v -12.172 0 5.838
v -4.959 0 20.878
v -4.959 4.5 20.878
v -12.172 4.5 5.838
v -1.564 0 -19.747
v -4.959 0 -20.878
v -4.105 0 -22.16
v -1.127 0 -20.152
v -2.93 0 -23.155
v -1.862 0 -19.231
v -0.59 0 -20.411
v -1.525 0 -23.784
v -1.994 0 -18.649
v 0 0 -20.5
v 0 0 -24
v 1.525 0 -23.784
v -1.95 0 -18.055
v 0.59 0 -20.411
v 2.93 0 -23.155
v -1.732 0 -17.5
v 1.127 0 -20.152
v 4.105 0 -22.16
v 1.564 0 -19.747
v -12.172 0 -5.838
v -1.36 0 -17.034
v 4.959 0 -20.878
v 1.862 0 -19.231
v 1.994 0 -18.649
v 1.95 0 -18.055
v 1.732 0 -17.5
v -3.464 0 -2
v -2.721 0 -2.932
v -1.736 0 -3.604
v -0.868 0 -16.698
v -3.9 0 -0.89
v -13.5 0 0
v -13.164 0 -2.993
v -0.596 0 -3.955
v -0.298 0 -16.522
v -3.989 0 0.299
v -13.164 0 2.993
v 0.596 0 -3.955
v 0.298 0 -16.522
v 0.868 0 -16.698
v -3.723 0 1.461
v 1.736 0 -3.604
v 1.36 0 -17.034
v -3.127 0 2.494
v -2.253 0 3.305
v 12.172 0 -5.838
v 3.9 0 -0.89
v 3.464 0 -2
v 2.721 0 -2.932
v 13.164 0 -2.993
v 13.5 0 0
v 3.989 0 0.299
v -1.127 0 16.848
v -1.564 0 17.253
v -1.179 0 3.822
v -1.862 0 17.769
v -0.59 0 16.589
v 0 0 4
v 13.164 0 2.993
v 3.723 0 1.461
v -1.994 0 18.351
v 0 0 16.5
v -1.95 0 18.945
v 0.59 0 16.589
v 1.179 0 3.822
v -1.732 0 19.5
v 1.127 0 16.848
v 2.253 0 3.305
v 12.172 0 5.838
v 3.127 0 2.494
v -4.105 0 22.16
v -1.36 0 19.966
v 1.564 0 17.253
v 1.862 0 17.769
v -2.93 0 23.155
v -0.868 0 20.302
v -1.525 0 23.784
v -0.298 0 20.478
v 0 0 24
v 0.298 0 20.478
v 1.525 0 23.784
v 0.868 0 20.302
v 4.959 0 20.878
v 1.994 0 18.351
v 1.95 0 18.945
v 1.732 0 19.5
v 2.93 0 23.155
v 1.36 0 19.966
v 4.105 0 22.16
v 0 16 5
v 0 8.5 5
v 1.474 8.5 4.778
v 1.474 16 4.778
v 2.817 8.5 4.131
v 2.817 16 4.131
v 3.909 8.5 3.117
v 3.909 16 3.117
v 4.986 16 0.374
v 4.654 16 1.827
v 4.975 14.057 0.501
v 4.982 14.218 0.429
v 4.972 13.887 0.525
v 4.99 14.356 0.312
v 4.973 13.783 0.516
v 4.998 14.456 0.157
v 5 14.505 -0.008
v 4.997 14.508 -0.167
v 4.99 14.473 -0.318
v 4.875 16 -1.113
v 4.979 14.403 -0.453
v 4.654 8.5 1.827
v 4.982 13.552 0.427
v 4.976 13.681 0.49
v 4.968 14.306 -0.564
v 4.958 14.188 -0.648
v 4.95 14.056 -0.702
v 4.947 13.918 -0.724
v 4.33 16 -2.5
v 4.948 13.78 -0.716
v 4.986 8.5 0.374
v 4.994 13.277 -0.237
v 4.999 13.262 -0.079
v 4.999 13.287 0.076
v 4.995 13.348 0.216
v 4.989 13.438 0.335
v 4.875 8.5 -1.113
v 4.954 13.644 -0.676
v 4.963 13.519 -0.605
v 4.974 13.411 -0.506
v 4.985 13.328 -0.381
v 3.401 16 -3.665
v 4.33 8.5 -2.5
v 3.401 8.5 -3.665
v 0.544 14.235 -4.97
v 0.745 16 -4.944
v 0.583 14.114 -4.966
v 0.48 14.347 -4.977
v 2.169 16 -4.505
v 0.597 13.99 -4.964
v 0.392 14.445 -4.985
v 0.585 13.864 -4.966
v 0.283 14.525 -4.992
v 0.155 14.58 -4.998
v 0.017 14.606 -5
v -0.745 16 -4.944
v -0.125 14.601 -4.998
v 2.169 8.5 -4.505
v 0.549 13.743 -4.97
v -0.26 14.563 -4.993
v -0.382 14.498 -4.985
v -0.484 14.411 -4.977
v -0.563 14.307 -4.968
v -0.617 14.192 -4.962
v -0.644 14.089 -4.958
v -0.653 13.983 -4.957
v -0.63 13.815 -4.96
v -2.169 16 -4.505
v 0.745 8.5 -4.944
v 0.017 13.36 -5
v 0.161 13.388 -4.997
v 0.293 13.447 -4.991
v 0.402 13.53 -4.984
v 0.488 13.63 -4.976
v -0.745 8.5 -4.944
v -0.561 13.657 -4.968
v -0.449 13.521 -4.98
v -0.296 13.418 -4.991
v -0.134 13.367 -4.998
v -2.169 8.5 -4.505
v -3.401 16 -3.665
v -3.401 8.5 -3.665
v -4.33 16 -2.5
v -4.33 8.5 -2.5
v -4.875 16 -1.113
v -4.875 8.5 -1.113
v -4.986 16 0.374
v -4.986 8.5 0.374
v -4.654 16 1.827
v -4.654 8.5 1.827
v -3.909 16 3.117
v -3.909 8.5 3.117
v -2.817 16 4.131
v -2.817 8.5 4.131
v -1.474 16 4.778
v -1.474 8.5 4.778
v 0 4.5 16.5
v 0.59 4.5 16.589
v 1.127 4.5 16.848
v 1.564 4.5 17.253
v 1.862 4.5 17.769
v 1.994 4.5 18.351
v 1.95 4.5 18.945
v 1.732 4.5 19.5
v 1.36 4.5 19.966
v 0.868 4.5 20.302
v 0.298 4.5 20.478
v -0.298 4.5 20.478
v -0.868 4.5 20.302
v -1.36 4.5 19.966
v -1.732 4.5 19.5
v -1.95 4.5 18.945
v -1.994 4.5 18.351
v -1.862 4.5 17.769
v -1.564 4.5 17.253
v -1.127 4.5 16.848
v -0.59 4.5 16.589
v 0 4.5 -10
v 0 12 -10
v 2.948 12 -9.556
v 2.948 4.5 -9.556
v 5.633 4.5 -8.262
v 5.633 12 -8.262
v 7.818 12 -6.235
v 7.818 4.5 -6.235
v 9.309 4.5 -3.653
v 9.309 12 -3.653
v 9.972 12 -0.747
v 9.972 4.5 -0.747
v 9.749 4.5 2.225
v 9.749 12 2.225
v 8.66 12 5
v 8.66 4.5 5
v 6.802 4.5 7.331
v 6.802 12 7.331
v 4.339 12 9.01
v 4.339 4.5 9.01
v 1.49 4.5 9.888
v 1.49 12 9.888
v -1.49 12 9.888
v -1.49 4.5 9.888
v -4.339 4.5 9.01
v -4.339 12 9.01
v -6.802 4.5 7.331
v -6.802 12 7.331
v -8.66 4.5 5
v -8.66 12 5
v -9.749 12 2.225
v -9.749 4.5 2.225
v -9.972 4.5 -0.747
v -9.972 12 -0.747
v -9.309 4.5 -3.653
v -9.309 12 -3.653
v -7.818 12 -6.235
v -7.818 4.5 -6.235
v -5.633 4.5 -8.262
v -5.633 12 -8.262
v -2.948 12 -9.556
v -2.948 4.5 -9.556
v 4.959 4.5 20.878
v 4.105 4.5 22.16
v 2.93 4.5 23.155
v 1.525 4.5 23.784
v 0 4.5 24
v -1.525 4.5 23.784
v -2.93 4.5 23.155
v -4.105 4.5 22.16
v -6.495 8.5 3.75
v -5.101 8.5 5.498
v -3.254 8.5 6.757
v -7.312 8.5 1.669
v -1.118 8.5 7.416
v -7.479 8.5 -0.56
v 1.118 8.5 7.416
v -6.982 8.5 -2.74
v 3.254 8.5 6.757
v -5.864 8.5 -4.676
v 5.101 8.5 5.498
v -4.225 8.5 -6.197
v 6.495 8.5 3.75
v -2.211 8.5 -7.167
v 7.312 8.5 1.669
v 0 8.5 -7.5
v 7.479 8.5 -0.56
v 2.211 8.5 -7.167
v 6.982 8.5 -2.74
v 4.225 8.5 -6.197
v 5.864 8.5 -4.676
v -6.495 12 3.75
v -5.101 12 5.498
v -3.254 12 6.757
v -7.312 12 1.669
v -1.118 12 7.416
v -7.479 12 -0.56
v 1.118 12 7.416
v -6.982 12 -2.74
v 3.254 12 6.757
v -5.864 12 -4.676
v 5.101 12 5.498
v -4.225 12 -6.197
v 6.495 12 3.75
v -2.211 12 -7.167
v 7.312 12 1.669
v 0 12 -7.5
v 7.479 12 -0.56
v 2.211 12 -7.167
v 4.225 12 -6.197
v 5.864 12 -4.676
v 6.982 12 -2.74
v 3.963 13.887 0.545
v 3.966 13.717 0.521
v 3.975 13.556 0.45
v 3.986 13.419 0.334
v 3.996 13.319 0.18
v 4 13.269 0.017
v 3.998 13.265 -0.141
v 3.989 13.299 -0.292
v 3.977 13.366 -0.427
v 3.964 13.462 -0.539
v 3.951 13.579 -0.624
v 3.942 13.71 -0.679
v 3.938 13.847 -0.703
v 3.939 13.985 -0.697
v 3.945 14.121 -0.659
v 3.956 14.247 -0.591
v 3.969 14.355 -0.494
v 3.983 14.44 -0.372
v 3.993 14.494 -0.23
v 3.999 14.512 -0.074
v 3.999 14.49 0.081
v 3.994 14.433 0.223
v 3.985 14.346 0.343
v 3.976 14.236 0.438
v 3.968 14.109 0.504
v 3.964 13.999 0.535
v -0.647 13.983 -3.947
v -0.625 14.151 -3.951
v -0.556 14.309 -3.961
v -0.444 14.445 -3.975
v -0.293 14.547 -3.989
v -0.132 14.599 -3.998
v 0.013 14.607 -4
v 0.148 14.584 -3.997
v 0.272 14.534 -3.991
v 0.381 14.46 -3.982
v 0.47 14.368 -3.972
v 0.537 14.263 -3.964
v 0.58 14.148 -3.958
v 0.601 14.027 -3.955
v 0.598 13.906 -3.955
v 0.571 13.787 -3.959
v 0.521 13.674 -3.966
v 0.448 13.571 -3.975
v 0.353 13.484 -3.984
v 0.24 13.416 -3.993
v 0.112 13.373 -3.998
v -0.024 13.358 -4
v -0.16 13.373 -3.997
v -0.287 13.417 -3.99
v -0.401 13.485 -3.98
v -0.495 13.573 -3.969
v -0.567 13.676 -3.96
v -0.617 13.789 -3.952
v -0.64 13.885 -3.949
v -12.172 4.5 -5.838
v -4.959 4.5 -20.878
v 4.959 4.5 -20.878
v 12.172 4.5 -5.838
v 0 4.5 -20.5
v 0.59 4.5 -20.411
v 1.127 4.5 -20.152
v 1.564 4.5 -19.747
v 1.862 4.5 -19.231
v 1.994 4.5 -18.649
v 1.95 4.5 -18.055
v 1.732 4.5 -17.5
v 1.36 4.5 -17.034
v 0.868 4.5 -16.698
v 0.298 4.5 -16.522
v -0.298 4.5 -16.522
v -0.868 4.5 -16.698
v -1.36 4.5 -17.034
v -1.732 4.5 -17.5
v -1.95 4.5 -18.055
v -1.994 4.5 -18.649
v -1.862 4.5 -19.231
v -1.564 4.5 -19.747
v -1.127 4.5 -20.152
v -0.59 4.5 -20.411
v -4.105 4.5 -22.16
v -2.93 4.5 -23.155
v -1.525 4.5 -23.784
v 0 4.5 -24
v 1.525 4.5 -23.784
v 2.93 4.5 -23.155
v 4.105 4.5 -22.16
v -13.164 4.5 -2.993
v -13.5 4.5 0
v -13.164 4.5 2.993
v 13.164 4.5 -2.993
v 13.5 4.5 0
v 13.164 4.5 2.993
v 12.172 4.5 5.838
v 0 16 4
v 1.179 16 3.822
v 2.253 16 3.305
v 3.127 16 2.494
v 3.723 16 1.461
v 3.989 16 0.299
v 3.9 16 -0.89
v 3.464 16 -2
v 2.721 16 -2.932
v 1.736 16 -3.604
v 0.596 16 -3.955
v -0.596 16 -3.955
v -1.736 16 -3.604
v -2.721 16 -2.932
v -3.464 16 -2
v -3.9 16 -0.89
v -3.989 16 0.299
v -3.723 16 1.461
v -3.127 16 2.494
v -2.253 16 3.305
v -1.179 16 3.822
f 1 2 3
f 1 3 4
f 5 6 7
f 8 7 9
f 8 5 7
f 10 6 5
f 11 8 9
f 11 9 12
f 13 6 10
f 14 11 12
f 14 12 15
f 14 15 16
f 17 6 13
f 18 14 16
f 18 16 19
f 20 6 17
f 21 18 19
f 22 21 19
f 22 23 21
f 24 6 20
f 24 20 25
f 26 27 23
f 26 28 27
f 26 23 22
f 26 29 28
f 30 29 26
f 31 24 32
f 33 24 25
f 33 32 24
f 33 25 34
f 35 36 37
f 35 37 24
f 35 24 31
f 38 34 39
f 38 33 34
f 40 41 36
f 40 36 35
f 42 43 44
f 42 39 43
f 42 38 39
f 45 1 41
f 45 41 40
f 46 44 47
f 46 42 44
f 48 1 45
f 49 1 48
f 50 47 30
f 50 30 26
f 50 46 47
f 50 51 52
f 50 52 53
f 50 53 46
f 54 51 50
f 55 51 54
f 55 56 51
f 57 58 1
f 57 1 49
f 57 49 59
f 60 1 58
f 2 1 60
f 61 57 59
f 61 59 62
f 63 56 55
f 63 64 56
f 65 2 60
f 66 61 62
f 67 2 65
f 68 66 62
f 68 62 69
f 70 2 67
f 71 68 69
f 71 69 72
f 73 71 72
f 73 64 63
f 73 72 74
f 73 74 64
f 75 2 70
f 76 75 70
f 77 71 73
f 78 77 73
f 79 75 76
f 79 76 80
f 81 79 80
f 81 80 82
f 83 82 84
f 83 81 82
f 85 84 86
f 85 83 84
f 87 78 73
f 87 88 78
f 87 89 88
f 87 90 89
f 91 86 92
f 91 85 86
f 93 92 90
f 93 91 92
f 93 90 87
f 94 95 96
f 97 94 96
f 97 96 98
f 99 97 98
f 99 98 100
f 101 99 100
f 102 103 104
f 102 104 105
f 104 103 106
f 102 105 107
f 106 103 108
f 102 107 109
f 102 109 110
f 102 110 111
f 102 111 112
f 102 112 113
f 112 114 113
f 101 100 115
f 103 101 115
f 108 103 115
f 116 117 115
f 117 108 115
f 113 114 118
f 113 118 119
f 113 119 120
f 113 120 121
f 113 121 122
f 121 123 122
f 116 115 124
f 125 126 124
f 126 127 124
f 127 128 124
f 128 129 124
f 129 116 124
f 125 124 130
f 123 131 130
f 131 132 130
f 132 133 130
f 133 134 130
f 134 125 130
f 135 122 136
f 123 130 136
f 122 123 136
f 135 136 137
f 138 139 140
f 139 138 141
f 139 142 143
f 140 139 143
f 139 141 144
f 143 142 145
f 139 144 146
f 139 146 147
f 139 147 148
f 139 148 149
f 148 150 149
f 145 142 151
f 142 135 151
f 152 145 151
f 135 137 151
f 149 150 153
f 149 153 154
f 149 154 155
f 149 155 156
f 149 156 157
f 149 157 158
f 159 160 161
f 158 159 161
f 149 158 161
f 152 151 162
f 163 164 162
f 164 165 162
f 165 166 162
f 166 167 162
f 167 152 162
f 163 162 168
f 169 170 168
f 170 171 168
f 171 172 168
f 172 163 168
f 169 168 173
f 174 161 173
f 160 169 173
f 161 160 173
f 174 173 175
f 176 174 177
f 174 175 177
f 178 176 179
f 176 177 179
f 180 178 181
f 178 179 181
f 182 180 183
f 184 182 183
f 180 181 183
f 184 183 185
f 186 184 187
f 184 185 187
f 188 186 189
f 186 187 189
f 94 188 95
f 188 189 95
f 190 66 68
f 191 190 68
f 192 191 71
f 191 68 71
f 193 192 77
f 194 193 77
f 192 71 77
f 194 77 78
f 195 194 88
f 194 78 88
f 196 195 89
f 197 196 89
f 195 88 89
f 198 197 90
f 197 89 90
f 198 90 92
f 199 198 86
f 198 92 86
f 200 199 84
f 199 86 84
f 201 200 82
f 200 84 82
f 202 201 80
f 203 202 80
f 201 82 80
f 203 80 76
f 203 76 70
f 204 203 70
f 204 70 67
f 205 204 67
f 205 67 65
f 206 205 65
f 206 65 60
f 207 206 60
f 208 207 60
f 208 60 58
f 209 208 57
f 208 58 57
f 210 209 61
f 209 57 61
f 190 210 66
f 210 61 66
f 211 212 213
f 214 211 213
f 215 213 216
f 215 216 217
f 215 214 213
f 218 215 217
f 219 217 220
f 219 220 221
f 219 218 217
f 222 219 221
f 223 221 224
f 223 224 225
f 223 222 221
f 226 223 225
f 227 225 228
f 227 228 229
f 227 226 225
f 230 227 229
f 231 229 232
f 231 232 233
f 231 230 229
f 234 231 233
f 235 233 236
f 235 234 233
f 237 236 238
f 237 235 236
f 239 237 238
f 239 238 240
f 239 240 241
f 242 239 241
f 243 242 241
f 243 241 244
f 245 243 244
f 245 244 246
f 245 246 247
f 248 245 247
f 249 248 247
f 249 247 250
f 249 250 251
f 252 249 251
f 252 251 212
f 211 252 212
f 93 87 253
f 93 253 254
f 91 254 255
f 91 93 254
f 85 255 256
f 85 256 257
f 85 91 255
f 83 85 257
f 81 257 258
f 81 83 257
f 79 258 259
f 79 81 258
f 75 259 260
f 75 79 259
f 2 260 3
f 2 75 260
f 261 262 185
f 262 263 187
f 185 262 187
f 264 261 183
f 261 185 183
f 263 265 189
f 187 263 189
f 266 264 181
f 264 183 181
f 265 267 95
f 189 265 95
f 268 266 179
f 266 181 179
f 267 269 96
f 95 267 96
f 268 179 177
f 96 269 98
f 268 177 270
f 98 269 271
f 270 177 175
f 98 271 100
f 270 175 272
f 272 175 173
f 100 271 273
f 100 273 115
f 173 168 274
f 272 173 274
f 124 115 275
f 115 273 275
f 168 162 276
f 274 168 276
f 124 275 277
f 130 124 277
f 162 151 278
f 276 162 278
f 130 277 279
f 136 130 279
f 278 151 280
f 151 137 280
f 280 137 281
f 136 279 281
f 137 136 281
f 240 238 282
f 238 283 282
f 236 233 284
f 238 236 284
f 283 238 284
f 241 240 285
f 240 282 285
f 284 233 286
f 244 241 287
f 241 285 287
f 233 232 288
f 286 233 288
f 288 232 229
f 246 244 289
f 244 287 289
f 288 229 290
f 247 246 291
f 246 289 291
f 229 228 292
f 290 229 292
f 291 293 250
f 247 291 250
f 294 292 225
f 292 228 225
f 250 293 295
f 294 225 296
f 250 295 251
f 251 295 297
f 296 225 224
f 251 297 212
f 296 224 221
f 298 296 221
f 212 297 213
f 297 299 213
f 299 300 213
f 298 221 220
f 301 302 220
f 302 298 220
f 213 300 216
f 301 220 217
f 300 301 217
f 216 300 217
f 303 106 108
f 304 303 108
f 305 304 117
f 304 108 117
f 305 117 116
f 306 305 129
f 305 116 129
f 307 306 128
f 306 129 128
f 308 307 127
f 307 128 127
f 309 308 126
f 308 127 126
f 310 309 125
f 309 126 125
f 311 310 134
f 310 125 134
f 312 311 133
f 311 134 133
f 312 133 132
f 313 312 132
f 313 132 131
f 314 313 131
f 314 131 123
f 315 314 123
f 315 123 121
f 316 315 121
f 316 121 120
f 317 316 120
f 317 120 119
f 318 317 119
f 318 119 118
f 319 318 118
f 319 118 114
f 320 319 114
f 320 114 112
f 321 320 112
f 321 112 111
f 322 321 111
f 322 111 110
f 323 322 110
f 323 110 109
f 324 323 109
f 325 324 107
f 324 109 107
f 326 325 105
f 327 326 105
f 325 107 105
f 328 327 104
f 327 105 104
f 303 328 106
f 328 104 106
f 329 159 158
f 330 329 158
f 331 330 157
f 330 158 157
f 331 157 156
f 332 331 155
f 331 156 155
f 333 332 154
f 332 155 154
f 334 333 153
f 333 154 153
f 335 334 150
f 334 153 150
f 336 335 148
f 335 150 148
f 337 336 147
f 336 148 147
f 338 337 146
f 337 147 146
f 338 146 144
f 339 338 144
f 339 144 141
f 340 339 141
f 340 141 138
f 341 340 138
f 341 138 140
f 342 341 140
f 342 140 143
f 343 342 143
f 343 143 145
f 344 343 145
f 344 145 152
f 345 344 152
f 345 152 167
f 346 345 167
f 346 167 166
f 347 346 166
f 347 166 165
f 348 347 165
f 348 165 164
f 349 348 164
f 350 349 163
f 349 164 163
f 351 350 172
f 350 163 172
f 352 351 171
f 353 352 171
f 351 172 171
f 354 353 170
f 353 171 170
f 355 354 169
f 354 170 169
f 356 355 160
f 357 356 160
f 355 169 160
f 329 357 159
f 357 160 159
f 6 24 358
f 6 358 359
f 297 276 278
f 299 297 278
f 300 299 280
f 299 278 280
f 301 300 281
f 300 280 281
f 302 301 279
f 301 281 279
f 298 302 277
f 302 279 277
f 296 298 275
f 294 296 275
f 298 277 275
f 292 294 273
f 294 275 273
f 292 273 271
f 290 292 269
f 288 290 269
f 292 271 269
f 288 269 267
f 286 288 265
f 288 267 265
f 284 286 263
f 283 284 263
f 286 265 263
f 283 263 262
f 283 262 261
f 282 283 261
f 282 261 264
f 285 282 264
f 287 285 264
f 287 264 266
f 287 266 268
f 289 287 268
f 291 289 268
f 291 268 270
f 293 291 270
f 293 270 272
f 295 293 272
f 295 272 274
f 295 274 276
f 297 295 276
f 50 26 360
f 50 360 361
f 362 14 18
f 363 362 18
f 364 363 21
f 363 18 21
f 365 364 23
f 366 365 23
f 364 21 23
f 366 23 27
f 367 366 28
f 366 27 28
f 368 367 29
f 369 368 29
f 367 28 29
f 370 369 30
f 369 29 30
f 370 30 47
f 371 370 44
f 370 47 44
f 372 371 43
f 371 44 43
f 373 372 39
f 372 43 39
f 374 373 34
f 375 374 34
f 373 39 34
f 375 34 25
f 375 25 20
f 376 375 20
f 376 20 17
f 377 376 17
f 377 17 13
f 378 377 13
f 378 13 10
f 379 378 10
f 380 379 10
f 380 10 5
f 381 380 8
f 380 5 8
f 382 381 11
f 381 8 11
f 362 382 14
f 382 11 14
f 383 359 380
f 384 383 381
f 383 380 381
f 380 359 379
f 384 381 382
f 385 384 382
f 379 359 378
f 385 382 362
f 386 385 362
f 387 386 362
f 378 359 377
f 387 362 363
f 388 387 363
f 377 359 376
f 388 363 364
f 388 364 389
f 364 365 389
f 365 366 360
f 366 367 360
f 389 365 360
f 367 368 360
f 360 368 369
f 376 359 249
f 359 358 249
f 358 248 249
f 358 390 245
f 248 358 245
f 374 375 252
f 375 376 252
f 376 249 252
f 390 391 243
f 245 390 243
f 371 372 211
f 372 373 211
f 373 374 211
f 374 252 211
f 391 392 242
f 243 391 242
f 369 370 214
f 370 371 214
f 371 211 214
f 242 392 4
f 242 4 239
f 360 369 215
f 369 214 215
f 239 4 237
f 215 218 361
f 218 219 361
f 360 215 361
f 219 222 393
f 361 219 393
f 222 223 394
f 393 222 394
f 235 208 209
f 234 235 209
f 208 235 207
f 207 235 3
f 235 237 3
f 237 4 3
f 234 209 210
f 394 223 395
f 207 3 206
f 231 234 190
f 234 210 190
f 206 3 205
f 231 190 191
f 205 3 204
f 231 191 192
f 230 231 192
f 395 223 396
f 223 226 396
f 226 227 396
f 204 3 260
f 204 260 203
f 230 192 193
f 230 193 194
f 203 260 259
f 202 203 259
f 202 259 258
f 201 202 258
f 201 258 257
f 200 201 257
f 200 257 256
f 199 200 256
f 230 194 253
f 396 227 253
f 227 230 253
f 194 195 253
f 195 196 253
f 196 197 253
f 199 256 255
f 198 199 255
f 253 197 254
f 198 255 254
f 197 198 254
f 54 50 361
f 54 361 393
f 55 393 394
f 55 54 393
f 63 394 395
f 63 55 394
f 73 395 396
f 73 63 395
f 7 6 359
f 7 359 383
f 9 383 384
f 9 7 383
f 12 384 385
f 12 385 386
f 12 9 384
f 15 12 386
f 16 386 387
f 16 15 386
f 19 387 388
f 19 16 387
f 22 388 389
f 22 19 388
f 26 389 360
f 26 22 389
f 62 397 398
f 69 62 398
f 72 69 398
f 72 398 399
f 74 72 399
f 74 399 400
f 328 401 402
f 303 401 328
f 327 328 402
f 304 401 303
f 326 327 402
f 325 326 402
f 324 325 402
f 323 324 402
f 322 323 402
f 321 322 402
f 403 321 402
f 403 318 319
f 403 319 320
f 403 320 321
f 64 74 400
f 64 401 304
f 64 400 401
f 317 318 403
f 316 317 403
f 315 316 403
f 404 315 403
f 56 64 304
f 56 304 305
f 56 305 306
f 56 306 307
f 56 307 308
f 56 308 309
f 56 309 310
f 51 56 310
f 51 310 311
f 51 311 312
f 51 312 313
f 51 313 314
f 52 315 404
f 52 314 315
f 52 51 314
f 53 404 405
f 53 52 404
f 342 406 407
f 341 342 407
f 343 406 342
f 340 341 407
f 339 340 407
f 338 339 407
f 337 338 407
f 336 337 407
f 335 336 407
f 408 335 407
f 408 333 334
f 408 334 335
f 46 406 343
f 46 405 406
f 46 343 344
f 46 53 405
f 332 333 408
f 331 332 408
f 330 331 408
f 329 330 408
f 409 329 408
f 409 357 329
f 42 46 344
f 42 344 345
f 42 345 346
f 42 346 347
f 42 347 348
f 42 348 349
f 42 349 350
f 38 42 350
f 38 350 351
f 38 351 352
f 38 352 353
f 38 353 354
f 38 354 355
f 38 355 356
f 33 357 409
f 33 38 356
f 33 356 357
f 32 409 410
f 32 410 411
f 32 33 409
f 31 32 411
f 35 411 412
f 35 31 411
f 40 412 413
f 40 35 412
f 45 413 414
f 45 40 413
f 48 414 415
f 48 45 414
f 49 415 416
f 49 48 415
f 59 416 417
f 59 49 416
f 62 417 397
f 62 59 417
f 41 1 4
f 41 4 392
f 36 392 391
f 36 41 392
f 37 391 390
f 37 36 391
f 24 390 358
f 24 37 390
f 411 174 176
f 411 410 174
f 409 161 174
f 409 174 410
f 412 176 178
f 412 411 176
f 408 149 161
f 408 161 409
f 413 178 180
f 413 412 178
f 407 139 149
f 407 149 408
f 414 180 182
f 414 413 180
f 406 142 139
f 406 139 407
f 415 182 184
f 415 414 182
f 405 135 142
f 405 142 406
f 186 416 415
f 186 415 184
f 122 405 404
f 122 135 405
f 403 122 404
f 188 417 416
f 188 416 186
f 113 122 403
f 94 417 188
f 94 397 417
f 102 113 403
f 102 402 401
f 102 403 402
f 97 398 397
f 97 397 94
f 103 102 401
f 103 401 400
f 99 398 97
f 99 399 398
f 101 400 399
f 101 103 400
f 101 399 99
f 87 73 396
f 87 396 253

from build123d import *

# Parameters (mm, degrees)
SKETCH_1_R                         = 5
SKETCH_1_R_2                       = 4
EXTRUDE_1_DEPTH                    = 16
SKETCH_2_R                         = 7.5
SKETCH_2_R_2                       = 5
EXTRUDE_2_DEPTH                    = 8.5
SKETCH_3_R                         = 10
SKETCH_3_R_2                       = 7.5
EXTRUDE_3_DEPTH                    = 12
SKETCH_4_R                         = 10
SKETCH_4_R_2                       = 2
EXTRUDE_4_DEPTH                    = 4.5
HOLE_WIZARD_M1_6_1_REACH           = 35.405
HOLE_WIZARD_M1_6_1_BORE_R          = 0.625
HOLE_WIZARD_M1_6_1_ON_FACE_2_REACH = 36.922
HOLE_WIZARD_M1_6_1_BORE_2_R        = 0.625


with BuildPart() as part:
    # 草图1 → 凸台-拉伸1 (new body)
    with BuildSketch(Plane(origin=(0, 0, 0), x_dir=(1, 0, 0), z_dir=(0, 1, 0))):
        with Locations(Location((0, 0, 0), (0, 0, 270))):
            Circle(SKETCH_1_R)
        with Locations(Location((0, 0, 0), (0, 0, 270))):
            Circle(SKETCH_1_R_2, mode=Mode.SUBTRACT)
    extrude(amount=EXTRUDE_1_DEPTH)

    # 草图2 → 凸台-拉伸2 (add)
    with BuildSketch(Plane.XZ):
        with Locations(Location((0, 0, 0), (0, 0, 270))):
            Circle(SKETCH_2_R)
        with Locations(Location((0, 0, 0), (0, 0, 270))):
            Circle(SKETCH_2_R_2, mode=Mode.SUBTRACT)
    extrude(amount=-EXTRUDE_2_DEPTH)

    # 草图3 → 凸台-拉伸3 (add)
    with BuildSketch(Plane.XZ):
        with Locations(Location((0, 0, 0), (0, 0, 270))):
            Circle(SKETCH_3_R)
        with Locations(Location((0, 0, 0), (0, 0, 270))):
            Circle(SKETCH_3_R_2, mode=Mode.SUBTRACT)
    extrude(amount=-EXTRUDE_3_DEPTH)

    # 草图4 → 凸台-拉伸4 (add)
    with BuildSketch(Plane.XZ):
        with BuildLine():
            Line((4.959164878, -20.878378378), (12.17249561, -5.837837838))
            ThreePointArc((12.17249561, -5.837837838), (13.5, 0), (12.17249561, 5.837837838))
            Line((12.17249561, 5.837837838), (4.959164878, 20.878378378))
            ThreePointArc((4.959164878, 20.878378378), (0, 24), (-4.959164878, 20.878378378))
            Line((-4.959164878, 20.878378378), (-12.17249561, 5.837837838))
            ThreePointArc((-12.17249561, 5.837837838), (-13.5, 0), (-12.17249561, -5.837837838))
            Line((-12.17249561, -5.837837838), (-4.959164878, -20.878378378))
            ThreePointArc((-4.959164878, -20.878378378), (0, -24), (4.959164878, -20.878378378))
        make_face()
        with Locations(Location((0, 0, 0), (0, 0, 270))):
            Circle(SKETCH_4_R, mode=Mode.SUBTRACT)
        with Locations(Location((0, 18.5, 0), (0, 0, 270))):
            Circle(SKETCH_4_R_2, mode=Mode.SUBTRACT)
        with Locations(Location((0, -18.5, 0), (0, 0, 270))):
            Circle(SKETCH_4_R_2, mode=Mode.SUBTRACT)
    extrude(amount=-EXTRUDE_4_DEPTH)

    # M1.6 螺纹孔1 bore (on position points) → M1.6 螺纹孔1 (cut, up to next)
    with BuildSketch(Plane(origin=(4.998978572, 13.886776662, -0.101060544), x_dir=(0.020212108711, 0, 0.999795714464), z_dir=(0.999795714464, 0, -0.020212108711)), mode=Mode.PRIVATE) as hole_wizard_m1_6_1_sk1:
        Circle(HOLE_WIZARD_M1_6_1_BORE_R)
    hole_wizard_m1_6_1_tool1 = extrude(hole_wizard_m1_6_1_sk1.sketch, amount=-HOLE_WIZARD_M1_6_1_REACH, mode=Mode.PRIVATE) & part.part
    add(hole_wizard_m1_6_1_tool1.solids().sort_by_distance((4.998979, 13.886777, -0.101061))[0], mode=Mode.SUBTRACT)

    # M1.6 螺纹孔1 bore 2 (on position points) → M1.6 螺纹孔1 on face 2 (cut, up to next)
    with BuildSketch(Plane(origin=(-0.028423278, 13.983100373, -4.999919211), x_dir=(-0.999983840262, 0, 0.005684999092), z_dir=(-0.005684999092, 0, -0.999983840262)), mode=Mode.PRIVATE) as hole_wizard_m1_6_1_on_face_2_sk1:
        Circle(HOLE_WIZARD_M1_6_1_BORE_2_R)
    hole_wizard_m1_6_1_on_face_2_tool1 = extrude(hole_wizard_m1_6_1_on_face_2_sk1.sketch, amount=-HOLE_WIZARD_M1_6_1_ON_FACE_2_REACH, mode=Mode.PRIVATE) & part.part
    add(hole_wizard_m1_6_1_on_face_2_tool1.solids().sort_by_distance((-0.028423, 13.9831, -4.999919))[0], mode=Mode.SUBTRACT)


solid = part.part
